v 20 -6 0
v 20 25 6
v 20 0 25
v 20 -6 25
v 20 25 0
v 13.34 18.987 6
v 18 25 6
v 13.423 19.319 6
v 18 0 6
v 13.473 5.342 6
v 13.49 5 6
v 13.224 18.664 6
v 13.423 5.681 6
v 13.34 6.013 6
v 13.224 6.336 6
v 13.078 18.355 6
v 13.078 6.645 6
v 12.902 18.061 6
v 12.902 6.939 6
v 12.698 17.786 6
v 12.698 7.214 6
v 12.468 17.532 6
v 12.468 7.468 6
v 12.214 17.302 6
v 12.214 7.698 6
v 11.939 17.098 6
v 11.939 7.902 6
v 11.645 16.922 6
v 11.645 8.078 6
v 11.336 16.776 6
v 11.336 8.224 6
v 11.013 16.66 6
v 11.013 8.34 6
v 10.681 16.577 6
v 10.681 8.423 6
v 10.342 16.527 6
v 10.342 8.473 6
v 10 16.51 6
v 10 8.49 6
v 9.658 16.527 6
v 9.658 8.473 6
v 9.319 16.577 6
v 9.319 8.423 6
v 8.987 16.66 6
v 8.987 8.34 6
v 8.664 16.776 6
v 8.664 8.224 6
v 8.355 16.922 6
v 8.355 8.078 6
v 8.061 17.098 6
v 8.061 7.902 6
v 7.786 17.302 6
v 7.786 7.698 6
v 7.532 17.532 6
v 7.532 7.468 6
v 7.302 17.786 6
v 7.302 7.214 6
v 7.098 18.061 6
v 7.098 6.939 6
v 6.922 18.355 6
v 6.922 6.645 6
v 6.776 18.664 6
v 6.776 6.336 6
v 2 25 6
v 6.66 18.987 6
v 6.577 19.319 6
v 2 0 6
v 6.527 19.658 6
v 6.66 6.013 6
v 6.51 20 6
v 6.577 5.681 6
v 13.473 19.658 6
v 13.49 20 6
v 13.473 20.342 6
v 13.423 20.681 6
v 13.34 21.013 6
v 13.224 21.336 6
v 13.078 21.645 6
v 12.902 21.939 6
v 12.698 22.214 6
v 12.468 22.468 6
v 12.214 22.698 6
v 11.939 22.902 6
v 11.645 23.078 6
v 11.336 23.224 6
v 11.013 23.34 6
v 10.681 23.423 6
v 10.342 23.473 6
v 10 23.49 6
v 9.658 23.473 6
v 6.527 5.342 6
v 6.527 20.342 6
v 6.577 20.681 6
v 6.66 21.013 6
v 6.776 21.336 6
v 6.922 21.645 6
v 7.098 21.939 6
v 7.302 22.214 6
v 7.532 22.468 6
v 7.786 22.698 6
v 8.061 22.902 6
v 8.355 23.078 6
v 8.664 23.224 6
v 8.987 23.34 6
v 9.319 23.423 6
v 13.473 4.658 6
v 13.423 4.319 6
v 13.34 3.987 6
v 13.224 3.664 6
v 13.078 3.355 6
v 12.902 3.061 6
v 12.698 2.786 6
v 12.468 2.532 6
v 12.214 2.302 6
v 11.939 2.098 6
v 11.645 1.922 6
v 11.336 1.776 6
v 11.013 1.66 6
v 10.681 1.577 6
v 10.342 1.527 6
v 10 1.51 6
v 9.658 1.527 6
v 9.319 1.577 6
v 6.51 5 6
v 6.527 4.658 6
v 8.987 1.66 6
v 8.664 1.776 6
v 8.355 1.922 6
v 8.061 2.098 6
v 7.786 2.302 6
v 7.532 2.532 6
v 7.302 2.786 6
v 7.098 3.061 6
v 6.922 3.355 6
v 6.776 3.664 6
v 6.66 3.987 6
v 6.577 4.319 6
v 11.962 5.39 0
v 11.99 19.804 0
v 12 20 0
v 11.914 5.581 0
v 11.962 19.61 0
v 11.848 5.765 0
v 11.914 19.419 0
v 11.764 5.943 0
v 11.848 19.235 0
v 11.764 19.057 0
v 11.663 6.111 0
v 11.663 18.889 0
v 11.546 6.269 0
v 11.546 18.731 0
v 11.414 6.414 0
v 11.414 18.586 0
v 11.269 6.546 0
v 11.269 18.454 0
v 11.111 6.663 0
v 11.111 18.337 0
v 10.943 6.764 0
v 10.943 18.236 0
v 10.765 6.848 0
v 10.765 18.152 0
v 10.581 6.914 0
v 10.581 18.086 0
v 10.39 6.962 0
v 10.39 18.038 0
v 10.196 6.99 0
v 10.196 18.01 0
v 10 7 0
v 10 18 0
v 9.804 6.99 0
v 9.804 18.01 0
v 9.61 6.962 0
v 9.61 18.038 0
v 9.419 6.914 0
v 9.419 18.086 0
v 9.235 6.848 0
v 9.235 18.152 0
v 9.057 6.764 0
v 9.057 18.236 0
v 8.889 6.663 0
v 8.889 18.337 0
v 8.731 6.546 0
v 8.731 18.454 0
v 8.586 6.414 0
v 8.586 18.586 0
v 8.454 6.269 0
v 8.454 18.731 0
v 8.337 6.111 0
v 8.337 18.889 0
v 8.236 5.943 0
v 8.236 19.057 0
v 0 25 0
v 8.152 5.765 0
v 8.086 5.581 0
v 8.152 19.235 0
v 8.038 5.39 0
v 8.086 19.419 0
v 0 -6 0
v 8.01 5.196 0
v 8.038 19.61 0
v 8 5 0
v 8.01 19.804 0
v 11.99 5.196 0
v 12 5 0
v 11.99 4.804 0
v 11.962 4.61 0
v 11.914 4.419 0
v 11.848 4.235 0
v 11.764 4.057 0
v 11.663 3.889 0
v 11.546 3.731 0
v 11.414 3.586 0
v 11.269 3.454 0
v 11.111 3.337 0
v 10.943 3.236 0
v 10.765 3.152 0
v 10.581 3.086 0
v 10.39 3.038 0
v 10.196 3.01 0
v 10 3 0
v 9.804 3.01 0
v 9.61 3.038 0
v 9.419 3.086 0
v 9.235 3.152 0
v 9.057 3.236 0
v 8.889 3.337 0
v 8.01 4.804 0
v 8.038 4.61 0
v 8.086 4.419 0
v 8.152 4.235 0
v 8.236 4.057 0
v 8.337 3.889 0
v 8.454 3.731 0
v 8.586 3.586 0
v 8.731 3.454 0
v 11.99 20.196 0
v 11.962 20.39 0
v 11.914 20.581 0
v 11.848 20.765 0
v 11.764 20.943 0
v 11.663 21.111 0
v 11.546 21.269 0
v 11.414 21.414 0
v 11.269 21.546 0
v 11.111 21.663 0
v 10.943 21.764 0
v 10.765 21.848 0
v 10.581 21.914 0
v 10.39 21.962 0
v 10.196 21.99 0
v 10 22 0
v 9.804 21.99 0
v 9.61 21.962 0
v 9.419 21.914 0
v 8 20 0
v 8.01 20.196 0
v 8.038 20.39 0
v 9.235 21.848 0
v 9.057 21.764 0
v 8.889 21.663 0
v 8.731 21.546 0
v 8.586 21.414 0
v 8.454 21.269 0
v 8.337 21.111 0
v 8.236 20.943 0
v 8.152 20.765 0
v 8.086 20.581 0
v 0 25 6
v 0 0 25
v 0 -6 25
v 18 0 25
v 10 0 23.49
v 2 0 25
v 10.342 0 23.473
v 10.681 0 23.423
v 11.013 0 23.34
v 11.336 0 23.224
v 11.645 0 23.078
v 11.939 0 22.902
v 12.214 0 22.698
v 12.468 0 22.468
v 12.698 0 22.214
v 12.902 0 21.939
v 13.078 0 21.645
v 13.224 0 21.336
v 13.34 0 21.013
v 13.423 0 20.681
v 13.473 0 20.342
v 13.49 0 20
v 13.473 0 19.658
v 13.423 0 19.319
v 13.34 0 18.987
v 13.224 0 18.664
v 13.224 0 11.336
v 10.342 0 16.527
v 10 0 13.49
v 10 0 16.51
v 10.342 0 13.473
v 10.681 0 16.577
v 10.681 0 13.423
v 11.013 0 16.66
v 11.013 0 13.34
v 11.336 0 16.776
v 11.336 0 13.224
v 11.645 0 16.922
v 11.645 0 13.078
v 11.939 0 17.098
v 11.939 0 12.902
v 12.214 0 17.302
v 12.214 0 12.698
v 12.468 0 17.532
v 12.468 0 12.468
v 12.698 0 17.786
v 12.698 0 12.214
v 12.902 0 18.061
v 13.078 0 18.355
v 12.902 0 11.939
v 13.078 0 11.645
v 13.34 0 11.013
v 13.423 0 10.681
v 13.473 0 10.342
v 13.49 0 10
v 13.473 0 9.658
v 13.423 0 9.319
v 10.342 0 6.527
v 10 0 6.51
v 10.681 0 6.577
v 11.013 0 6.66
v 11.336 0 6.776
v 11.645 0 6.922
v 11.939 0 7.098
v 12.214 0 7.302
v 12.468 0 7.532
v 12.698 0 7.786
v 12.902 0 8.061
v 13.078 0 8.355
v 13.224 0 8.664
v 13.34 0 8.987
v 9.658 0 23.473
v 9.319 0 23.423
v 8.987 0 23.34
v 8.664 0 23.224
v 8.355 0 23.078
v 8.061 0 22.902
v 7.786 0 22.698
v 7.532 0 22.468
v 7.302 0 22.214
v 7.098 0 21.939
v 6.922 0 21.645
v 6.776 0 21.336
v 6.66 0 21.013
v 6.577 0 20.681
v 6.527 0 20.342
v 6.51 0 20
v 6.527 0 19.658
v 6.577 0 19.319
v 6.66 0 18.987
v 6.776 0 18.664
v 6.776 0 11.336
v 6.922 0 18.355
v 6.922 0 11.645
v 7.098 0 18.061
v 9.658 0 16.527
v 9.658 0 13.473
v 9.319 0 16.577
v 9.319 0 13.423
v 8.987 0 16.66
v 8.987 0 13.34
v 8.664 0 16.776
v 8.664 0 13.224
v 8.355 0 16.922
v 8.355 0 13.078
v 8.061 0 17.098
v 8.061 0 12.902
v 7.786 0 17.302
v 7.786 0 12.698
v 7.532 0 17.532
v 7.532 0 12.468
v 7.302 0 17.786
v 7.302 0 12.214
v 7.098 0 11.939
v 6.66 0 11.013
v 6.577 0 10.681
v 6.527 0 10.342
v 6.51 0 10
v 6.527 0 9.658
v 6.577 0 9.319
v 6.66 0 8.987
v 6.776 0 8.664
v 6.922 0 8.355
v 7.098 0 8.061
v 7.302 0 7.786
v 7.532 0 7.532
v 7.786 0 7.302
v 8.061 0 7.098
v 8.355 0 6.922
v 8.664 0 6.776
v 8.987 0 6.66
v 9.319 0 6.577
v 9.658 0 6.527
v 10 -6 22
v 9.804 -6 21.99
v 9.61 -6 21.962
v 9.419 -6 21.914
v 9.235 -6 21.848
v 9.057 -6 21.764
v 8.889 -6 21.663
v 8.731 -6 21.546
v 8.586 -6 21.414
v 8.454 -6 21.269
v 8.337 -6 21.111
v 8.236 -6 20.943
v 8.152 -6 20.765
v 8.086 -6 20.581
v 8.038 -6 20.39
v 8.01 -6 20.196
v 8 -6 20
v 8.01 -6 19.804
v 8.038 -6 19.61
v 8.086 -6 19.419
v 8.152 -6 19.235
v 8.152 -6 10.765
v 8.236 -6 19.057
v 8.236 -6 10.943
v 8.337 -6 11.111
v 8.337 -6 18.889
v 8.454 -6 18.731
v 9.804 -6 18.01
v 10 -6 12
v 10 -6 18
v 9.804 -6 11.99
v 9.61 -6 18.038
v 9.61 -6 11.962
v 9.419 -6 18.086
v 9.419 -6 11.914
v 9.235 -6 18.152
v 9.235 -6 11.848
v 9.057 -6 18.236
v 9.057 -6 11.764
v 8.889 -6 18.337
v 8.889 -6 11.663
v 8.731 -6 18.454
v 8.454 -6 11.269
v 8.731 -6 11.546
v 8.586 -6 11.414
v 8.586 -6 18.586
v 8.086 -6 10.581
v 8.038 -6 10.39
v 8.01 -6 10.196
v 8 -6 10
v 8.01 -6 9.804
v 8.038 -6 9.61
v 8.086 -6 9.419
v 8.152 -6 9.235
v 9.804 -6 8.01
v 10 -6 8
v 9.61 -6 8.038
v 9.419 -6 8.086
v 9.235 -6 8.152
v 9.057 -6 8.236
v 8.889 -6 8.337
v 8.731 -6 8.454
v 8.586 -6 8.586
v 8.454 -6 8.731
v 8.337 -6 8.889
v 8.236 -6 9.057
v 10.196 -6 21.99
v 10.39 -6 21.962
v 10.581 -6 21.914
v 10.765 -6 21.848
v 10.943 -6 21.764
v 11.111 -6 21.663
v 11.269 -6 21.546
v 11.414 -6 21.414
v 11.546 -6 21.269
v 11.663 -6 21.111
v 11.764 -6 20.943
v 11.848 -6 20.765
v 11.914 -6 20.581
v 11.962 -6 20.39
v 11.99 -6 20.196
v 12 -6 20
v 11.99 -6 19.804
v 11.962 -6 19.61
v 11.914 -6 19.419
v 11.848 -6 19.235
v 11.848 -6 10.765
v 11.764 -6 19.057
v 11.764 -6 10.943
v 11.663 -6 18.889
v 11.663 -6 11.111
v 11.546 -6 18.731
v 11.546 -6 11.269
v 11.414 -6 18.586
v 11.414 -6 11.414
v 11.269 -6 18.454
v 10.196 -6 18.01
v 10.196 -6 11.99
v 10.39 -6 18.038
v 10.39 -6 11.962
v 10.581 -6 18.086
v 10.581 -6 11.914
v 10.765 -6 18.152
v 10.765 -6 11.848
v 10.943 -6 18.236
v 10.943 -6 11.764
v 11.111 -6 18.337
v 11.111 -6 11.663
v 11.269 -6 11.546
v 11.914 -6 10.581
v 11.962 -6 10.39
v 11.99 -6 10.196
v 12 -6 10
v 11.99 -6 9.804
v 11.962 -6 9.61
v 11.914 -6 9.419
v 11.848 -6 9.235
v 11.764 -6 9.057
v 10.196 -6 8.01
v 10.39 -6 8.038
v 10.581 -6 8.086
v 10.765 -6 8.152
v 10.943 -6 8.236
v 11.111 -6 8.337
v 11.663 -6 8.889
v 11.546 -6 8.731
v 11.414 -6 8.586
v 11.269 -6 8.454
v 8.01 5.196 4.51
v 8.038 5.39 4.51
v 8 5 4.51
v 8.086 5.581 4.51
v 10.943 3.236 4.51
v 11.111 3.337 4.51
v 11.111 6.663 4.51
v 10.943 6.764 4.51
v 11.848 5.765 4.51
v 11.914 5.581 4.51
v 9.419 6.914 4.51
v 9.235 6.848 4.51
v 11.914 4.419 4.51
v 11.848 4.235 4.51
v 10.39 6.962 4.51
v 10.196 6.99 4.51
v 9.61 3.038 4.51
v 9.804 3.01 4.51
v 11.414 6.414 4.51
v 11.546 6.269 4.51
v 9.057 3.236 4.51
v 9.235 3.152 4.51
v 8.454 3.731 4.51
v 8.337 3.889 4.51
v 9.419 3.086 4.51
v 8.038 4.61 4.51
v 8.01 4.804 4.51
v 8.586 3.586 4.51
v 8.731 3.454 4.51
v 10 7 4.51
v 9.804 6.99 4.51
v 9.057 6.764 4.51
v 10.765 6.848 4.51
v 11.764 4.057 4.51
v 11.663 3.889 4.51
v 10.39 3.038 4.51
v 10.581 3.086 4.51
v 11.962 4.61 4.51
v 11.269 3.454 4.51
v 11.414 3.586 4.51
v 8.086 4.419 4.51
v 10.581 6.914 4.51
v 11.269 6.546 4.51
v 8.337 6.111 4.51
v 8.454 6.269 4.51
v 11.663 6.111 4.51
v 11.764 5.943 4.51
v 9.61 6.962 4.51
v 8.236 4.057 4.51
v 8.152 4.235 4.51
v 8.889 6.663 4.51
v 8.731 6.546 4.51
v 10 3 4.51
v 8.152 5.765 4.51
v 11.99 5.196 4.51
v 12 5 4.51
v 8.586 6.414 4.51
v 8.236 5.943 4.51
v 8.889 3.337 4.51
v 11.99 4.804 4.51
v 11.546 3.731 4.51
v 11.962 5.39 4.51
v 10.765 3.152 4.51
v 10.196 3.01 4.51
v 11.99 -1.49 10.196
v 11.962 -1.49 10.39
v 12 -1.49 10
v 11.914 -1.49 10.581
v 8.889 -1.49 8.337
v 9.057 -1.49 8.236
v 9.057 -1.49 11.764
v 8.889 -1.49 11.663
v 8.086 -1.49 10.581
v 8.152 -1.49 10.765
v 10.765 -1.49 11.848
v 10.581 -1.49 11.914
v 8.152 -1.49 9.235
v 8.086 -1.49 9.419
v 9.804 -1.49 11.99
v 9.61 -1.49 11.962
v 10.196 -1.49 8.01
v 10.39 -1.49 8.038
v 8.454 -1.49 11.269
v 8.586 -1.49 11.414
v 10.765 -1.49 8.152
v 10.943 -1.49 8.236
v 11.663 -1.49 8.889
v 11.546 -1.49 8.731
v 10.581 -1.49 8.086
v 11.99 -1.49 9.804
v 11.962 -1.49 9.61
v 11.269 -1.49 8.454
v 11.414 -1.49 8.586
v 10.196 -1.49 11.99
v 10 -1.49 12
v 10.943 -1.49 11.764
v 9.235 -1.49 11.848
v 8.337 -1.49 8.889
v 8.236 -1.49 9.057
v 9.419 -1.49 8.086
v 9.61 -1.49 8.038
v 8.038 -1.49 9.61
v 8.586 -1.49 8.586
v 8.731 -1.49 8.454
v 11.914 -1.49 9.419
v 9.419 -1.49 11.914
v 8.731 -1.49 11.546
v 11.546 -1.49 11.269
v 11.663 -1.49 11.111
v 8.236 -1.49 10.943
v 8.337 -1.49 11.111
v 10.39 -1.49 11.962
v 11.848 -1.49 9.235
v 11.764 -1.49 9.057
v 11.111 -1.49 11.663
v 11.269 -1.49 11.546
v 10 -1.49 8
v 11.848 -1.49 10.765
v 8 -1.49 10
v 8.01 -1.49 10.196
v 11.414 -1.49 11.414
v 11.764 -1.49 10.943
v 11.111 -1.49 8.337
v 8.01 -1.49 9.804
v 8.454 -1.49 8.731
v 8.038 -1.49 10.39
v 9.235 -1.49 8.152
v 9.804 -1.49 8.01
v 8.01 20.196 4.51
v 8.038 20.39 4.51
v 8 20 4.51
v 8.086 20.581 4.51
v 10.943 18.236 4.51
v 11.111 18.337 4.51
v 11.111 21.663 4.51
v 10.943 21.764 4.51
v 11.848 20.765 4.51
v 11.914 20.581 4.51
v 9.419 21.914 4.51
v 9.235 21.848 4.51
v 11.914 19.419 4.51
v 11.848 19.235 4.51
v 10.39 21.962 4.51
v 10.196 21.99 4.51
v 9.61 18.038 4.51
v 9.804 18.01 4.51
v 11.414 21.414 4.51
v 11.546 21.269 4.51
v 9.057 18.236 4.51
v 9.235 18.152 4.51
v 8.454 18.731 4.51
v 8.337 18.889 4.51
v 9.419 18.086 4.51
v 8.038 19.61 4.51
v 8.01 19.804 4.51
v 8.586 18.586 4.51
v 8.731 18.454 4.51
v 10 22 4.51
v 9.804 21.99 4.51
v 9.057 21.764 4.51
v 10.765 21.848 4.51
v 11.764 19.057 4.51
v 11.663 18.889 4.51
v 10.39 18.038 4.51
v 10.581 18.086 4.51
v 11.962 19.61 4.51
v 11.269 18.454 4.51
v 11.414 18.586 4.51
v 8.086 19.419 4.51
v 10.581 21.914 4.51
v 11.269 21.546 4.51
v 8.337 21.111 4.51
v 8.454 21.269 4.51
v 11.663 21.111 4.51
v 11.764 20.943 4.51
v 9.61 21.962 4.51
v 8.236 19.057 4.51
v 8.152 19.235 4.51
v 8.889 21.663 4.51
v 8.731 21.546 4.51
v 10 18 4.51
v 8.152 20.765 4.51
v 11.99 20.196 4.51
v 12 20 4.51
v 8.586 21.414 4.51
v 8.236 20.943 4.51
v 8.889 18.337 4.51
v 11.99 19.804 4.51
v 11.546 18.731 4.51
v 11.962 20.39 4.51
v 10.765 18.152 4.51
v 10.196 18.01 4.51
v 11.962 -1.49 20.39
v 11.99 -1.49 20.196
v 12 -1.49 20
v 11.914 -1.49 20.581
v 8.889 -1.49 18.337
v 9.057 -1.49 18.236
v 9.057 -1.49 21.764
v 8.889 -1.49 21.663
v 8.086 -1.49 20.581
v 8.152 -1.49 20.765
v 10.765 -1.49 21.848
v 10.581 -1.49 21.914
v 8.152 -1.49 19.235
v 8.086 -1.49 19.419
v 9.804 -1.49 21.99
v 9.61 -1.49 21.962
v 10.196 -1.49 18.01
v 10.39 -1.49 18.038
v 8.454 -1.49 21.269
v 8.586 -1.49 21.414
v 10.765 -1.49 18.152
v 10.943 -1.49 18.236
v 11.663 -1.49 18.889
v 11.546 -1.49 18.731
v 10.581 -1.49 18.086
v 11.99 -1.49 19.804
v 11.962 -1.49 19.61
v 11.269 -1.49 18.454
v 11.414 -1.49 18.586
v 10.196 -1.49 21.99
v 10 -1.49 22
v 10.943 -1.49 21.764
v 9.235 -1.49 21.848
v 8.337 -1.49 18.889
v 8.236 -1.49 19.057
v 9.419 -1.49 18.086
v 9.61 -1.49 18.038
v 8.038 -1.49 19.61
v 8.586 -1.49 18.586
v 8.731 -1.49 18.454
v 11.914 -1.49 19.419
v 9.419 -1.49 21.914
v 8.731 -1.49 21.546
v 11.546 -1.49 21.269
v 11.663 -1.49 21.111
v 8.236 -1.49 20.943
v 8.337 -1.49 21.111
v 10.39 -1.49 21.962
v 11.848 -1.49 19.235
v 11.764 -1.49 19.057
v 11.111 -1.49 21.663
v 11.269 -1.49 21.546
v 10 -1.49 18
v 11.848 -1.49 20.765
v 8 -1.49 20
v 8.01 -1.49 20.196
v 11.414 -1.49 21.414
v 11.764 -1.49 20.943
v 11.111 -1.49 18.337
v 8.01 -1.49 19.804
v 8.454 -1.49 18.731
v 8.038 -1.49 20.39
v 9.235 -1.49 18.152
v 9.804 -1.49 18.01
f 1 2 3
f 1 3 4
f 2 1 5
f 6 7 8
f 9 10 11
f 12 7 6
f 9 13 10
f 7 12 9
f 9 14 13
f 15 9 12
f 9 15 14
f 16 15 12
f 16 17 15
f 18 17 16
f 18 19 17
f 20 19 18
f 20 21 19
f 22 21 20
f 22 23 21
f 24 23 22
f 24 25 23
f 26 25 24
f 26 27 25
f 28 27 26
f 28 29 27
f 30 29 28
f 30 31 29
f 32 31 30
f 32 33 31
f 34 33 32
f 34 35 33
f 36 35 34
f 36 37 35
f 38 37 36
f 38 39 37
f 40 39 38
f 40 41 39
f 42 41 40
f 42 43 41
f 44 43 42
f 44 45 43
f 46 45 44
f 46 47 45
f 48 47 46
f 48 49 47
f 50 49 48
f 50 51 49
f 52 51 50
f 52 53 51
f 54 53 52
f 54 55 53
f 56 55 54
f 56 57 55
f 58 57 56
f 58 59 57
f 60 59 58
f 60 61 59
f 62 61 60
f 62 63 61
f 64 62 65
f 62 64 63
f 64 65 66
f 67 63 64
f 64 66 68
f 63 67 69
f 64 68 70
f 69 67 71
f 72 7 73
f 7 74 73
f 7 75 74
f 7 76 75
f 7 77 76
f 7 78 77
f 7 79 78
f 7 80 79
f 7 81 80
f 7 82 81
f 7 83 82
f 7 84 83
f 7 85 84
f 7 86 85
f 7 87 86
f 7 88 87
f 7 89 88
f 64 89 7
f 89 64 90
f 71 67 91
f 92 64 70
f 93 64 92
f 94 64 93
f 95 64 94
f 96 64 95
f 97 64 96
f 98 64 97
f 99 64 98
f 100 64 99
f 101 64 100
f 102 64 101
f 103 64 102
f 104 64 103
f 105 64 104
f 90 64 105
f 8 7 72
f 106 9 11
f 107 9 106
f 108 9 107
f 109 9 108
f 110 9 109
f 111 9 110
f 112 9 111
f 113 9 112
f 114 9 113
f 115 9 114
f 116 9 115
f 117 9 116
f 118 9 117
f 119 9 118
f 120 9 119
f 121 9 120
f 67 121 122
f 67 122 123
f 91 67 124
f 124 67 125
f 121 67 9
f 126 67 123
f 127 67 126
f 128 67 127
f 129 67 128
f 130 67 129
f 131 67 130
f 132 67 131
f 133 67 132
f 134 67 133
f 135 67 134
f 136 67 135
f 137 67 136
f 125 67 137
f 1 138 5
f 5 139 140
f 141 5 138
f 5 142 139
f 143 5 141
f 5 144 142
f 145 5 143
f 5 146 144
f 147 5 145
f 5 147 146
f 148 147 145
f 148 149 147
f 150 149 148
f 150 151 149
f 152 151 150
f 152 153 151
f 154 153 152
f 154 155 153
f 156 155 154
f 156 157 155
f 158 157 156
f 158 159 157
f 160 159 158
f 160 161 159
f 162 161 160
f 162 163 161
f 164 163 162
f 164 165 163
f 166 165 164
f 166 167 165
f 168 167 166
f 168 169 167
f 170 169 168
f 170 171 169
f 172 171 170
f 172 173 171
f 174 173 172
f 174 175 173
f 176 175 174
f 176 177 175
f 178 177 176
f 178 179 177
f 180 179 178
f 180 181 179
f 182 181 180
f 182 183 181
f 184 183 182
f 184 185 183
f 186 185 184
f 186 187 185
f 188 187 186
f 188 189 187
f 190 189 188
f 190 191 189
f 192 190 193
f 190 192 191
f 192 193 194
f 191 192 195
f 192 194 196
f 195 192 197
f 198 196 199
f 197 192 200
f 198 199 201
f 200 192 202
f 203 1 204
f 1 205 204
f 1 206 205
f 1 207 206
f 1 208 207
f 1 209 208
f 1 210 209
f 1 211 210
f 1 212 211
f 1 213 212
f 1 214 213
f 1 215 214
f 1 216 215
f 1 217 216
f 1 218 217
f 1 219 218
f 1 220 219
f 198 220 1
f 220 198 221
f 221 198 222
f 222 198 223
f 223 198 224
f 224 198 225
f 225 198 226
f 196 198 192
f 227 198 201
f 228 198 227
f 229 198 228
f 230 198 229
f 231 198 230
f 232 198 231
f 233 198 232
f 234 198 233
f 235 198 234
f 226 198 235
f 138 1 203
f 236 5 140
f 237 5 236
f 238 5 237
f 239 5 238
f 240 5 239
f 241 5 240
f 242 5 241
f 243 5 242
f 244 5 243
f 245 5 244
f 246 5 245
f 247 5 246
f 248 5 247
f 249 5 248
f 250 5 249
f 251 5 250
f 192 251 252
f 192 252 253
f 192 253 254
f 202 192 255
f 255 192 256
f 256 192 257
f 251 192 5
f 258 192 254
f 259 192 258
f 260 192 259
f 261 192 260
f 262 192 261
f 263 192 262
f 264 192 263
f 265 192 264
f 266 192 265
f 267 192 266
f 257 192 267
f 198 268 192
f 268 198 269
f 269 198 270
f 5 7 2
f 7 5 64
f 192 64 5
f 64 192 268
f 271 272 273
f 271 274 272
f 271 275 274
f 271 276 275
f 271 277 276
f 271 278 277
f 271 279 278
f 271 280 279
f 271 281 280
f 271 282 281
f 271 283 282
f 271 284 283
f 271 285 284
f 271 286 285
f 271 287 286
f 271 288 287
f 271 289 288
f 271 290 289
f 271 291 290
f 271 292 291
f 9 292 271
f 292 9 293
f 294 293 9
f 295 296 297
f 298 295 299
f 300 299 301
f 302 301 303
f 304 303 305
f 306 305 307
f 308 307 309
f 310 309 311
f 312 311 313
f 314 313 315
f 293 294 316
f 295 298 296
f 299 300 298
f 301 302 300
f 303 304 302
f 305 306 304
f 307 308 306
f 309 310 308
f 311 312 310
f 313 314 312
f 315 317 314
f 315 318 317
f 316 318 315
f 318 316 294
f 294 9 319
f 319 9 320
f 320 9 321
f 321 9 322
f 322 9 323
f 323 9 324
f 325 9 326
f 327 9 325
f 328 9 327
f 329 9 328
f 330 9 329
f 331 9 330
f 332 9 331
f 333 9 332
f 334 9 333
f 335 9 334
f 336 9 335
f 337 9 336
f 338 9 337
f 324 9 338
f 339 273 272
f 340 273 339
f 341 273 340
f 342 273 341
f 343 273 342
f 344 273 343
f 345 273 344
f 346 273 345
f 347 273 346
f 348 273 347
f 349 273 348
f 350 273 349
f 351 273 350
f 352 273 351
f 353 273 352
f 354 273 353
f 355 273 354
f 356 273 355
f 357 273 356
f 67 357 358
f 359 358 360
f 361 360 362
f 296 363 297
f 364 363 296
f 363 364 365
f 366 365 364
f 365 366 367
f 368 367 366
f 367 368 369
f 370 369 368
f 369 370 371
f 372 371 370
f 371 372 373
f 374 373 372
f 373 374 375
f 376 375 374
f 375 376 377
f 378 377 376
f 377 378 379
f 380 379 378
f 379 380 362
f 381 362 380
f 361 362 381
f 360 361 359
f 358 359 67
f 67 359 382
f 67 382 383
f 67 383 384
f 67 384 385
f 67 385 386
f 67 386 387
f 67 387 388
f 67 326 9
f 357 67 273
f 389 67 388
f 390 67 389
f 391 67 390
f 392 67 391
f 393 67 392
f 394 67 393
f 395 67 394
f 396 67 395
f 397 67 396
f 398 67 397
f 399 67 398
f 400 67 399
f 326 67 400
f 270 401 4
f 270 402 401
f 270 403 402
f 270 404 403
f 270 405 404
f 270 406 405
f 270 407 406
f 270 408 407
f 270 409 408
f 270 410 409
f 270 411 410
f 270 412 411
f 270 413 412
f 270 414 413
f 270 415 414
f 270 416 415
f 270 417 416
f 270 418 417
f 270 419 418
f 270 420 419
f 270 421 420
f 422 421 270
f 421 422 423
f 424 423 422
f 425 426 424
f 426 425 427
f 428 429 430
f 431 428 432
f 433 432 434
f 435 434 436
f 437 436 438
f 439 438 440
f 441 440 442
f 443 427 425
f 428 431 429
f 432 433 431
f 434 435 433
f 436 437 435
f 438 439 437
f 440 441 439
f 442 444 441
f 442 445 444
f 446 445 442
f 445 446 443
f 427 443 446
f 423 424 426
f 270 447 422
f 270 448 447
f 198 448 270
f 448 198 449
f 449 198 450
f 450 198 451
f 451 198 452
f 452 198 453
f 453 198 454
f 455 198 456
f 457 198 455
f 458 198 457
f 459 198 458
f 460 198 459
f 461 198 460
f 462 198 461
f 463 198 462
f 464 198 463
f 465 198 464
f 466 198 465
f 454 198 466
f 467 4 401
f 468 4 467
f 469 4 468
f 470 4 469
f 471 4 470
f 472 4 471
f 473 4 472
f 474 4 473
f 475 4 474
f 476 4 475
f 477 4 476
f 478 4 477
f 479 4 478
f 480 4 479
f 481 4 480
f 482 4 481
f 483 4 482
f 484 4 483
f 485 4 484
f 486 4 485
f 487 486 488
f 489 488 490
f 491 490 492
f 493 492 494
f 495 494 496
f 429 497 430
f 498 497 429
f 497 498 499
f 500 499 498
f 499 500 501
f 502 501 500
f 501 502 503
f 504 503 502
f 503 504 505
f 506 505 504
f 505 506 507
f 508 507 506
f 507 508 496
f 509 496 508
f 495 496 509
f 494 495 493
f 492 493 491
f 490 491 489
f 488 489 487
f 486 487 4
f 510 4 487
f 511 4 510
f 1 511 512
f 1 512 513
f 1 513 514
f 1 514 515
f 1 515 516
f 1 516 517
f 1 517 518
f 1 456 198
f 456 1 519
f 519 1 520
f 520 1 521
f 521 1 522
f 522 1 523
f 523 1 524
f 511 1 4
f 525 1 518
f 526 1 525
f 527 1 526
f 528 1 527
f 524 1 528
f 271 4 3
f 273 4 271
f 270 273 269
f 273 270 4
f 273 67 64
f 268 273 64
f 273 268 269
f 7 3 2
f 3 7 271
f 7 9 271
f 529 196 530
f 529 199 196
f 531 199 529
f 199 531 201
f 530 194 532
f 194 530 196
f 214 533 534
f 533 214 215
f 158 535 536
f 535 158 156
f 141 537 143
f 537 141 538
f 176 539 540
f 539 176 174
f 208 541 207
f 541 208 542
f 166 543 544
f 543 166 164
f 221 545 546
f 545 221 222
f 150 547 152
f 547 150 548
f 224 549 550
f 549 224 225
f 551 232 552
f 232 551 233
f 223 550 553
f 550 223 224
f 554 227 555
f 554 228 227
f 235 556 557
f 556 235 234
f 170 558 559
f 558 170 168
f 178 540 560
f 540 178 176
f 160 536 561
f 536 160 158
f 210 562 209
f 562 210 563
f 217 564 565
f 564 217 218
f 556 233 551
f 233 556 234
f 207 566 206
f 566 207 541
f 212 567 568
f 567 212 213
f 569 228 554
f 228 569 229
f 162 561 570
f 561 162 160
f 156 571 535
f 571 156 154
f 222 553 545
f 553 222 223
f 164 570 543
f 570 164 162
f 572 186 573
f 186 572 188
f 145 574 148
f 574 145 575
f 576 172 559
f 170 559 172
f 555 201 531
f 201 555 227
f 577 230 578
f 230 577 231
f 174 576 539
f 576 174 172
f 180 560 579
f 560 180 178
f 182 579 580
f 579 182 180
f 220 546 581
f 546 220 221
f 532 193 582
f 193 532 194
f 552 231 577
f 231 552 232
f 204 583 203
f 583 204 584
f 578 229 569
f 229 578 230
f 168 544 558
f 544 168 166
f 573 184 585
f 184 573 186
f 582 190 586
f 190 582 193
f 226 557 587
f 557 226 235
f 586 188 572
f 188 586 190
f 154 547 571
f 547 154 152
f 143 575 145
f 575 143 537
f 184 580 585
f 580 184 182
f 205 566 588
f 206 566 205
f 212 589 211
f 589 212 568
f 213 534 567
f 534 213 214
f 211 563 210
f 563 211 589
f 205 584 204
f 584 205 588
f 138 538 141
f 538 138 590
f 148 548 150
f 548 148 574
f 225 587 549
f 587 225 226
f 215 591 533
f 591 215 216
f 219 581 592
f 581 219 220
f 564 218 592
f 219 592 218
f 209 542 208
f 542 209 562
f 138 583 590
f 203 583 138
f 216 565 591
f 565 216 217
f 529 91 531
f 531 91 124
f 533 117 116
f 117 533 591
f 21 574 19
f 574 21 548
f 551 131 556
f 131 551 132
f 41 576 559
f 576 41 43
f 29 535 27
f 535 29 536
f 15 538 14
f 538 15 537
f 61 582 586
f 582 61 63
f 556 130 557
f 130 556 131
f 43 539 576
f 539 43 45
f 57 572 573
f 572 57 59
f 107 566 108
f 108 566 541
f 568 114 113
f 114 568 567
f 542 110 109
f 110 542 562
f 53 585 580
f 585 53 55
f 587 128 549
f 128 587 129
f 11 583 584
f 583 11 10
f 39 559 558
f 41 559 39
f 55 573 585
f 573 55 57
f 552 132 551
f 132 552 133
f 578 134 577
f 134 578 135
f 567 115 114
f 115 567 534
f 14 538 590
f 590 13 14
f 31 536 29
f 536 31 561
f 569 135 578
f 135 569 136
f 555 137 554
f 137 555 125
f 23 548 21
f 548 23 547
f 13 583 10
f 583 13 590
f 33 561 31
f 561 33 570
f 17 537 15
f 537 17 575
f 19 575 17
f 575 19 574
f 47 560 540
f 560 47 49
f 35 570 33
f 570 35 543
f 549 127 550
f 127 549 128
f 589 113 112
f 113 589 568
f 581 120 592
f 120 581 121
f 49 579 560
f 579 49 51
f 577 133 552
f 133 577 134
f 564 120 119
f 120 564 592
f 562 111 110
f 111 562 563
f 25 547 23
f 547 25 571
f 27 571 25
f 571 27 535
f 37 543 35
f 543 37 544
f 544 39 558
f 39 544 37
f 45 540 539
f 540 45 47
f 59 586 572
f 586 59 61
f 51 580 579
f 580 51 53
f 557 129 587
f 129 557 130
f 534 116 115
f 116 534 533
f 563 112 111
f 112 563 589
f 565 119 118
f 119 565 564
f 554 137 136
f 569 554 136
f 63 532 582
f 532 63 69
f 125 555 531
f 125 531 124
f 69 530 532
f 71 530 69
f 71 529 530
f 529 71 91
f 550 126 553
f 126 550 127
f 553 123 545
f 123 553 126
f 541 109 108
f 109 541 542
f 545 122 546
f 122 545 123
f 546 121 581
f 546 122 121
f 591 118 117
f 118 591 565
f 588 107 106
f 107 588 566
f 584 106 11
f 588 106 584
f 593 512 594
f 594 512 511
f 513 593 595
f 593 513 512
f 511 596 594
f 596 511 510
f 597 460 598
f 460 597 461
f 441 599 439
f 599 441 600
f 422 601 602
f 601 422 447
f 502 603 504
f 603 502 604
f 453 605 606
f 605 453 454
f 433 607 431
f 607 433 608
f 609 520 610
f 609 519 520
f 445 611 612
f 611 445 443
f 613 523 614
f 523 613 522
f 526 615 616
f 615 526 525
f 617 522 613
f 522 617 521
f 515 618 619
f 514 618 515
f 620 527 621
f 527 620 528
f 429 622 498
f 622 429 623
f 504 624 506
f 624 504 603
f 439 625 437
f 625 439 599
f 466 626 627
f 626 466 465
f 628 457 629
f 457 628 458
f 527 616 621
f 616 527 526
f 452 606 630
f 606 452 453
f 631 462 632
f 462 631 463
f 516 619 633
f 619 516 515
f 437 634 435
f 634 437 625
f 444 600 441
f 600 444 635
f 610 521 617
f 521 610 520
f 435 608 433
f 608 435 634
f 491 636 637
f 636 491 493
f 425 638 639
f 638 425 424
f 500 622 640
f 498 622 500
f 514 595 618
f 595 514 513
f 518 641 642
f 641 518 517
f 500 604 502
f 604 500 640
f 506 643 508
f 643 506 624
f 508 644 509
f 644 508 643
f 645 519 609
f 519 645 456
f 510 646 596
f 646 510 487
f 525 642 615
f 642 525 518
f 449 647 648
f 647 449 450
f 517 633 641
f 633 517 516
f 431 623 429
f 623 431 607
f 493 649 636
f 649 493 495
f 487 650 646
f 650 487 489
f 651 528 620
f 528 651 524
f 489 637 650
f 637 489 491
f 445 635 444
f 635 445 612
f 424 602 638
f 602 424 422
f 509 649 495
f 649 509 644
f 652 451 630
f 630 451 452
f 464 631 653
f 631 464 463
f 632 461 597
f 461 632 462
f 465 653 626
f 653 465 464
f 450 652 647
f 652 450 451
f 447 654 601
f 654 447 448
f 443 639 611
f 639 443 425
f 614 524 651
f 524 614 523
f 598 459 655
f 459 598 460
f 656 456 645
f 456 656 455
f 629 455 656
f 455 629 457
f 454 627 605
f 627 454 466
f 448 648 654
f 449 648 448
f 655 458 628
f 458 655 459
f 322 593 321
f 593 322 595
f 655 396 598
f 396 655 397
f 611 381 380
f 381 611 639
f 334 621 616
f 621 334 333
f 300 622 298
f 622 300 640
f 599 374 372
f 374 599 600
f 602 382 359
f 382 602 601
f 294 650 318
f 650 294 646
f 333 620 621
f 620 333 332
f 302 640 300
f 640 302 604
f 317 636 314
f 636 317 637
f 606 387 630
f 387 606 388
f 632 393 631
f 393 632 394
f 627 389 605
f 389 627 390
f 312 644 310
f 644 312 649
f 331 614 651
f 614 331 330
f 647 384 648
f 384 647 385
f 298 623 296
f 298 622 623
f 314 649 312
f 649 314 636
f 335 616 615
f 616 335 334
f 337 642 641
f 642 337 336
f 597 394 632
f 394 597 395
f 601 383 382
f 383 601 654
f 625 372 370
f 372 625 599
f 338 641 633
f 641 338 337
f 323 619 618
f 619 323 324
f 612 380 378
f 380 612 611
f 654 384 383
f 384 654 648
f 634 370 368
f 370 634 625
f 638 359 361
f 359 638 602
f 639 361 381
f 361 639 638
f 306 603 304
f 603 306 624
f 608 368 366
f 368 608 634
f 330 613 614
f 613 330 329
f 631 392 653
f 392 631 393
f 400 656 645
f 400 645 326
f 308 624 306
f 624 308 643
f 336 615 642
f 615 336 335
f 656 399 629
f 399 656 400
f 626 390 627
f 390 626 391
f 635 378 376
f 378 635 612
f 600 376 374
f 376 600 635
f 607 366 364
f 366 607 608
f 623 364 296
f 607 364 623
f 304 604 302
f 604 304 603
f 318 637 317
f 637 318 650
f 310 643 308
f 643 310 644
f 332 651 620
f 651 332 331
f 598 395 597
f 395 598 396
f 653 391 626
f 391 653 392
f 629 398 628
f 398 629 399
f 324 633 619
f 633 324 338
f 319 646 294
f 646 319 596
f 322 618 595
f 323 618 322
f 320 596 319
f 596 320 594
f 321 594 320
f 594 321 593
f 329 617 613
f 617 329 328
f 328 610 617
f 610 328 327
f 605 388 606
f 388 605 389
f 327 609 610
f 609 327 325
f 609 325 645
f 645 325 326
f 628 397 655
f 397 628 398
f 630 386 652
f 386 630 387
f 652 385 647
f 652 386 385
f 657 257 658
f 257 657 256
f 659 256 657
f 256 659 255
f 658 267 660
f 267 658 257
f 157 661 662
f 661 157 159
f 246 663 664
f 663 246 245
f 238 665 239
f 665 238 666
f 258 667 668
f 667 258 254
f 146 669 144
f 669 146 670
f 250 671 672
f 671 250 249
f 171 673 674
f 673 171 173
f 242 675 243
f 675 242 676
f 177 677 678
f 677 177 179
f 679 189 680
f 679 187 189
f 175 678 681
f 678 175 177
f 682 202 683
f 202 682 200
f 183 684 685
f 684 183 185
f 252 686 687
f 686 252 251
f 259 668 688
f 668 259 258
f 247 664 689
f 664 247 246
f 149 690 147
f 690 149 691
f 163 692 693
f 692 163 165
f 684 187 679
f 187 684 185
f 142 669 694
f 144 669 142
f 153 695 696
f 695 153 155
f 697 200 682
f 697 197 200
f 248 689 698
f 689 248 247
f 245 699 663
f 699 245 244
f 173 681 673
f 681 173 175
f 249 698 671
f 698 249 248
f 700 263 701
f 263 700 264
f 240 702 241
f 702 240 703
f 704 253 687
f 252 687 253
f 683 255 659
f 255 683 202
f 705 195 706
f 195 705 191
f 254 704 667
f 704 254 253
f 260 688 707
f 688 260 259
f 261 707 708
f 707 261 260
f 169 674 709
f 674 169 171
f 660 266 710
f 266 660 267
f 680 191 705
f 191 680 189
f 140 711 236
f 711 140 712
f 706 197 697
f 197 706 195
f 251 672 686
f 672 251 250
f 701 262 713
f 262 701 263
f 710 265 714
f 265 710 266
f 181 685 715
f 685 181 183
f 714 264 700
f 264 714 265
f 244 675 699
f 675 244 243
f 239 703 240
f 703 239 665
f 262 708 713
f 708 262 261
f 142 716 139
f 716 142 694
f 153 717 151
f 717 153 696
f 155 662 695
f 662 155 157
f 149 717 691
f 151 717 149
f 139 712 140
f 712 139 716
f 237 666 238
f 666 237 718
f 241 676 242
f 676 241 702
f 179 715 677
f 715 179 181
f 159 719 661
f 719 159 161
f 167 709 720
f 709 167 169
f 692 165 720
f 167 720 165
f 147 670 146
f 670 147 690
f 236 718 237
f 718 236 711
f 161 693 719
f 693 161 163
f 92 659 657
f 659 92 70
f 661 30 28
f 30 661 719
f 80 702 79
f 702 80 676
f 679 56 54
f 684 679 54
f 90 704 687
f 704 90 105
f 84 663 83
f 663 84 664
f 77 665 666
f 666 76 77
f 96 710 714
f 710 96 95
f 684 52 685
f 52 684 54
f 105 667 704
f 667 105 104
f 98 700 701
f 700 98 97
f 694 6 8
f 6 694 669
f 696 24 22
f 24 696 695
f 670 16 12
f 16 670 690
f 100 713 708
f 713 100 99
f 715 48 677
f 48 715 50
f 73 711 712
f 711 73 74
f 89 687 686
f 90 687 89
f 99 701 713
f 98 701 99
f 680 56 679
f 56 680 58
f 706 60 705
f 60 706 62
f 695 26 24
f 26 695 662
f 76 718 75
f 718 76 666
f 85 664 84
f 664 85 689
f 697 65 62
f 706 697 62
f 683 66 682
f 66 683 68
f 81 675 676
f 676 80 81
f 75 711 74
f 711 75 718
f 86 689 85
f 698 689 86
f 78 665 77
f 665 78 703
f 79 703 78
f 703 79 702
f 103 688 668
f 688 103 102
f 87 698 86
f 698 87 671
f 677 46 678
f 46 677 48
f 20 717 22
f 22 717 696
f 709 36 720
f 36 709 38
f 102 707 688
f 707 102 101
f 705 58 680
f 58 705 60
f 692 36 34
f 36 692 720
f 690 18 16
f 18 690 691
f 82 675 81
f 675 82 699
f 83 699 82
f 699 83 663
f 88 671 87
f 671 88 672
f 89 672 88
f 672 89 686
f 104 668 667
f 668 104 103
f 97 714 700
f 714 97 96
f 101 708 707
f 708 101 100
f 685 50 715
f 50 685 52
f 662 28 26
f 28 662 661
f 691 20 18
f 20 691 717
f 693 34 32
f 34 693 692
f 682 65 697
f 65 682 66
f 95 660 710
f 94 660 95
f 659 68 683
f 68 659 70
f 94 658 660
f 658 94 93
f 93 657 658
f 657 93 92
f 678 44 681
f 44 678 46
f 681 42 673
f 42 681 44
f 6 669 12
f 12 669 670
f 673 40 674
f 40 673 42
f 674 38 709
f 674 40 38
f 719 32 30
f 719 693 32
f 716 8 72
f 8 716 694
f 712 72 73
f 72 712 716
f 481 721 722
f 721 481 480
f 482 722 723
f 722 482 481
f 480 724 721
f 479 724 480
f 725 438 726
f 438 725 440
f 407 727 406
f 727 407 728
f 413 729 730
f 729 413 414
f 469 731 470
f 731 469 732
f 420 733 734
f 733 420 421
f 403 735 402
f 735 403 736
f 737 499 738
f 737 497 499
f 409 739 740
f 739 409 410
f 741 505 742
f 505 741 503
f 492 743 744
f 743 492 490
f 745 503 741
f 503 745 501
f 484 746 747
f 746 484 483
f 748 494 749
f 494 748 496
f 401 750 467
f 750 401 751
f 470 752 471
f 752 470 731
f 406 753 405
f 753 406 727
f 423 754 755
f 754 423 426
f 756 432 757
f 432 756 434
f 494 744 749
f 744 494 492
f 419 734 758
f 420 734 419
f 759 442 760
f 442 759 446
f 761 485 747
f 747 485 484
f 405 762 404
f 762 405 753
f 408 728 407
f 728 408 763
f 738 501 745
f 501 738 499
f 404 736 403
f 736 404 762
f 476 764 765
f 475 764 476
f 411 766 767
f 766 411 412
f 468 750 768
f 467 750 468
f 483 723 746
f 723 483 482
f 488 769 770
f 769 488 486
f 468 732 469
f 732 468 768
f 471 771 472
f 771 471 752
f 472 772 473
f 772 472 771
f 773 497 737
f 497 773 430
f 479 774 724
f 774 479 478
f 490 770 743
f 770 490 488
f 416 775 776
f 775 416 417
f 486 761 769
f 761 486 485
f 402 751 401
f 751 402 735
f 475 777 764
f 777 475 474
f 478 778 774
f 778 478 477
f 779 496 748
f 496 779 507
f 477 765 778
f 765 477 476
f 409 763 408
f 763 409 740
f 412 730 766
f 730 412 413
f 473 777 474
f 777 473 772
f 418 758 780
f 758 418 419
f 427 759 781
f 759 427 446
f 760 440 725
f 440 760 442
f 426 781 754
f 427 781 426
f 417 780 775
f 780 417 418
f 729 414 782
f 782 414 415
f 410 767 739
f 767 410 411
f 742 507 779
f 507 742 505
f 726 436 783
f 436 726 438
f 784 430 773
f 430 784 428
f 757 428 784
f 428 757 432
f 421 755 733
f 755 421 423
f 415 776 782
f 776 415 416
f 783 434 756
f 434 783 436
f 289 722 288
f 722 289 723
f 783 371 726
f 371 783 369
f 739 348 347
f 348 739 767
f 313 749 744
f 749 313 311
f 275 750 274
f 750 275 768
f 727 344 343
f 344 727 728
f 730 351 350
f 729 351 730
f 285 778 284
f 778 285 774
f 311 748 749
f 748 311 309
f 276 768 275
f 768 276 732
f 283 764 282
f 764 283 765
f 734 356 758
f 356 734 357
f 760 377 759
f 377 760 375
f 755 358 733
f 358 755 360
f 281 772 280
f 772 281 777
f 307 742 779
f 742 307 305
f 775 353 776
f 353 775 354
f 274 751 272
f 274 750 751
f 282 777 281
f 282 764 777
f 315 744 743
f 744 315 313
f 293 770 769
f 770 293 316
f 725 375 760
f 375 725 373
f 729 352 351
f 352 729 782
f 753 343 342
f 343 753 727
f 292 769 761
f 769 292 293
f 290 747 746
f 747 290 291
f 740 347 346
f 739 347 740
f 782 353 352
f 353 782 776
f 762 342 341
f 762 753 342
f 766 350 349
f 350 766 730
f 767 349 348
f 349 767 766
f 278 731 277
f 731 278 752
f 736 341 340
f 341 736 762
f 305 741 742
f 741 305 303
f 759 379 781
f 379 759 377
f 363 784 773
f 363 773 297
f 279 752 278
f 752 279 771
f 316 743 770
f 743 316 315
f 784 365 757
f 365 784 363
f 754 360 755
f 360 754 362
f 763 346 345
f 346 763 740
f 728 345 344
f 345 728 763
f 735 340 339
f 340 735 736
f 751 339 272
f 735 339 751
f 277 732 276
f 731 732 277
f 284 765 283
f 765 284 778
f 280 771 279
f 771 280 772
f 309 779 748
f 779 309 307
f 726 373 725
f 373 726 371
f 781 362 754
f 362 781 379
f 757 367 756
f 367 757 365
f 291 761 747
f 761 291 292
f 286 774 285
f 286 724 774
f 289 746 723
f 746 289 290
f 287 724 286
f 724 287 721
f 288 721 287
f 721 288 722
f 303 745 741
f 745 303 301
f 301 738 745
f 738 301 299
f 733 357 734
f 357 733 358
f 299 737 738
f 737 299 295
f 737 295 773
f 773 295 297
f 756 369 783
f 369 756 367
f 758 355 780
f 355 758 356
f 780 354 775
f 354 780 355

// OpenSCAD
$fn=64;


// taken from Prusa 3 repository
module screw(h=20, r=2, r_head=3.5, head_drop=0, slant=true, poly=false, $fn=64){
    //makes screw with head
    //for substraction as screw hole
    if (poly) {
        cylinder_poly(h=h, r=r, $fn=$fn);
    } else {
        cylinder(h=h, r=r, $fn=$fn);
    }
    if (slant) {
        translate([0, 0, head_drop-0.01]) cylinder(h=r_head, r2=0, r1=r_head, $fn=$fn);
    }

    if (head_drop > 0) {
        translate([0, 0, -0.01]) cylinder(h=head_drop+0.01, r=r_head, $fn=$fn);
    }
}


module angle(x,y,thickness, side_thickness){
    difference(){
        
        union(){
            cube([x,y,thickness]);
            translate([0,0,0]) rotate([90,0,0]) cube([x,y,thickness]);
            
            hull(){
                translate([0,y-side_thickness,0]) cube([side_thickness,side_thickness,thickness]);
                translate([0,-side_thickness,0]) cube([side_thickness,side_thickness,y]);            
            }
            hull(){
                translate([x-side_thickness,y-side_thickness,0]) cube([side_thickness,side_thickness,thickness]);
                translate([x-side_thickness,-side_thickness,0]) cube([side_thickness,side_thickness,y]);            
            }
        
        }    
        for(f=[0:y/20]){ 
            for(i=[0:x/20]){ 
                translate([10+20*i,5+15*f,thickness]) rotate([0,180,0]) screw();
                translate([10+15*i,0,10+10*f]) rotate([90,0,0]) screw();
            }       
        }
      //  translate([-0.1,10,13.5]) rotate([0,90,0]) cylinder(r=2.7,h=6);

    }

}
angle(20,25,6,2);
